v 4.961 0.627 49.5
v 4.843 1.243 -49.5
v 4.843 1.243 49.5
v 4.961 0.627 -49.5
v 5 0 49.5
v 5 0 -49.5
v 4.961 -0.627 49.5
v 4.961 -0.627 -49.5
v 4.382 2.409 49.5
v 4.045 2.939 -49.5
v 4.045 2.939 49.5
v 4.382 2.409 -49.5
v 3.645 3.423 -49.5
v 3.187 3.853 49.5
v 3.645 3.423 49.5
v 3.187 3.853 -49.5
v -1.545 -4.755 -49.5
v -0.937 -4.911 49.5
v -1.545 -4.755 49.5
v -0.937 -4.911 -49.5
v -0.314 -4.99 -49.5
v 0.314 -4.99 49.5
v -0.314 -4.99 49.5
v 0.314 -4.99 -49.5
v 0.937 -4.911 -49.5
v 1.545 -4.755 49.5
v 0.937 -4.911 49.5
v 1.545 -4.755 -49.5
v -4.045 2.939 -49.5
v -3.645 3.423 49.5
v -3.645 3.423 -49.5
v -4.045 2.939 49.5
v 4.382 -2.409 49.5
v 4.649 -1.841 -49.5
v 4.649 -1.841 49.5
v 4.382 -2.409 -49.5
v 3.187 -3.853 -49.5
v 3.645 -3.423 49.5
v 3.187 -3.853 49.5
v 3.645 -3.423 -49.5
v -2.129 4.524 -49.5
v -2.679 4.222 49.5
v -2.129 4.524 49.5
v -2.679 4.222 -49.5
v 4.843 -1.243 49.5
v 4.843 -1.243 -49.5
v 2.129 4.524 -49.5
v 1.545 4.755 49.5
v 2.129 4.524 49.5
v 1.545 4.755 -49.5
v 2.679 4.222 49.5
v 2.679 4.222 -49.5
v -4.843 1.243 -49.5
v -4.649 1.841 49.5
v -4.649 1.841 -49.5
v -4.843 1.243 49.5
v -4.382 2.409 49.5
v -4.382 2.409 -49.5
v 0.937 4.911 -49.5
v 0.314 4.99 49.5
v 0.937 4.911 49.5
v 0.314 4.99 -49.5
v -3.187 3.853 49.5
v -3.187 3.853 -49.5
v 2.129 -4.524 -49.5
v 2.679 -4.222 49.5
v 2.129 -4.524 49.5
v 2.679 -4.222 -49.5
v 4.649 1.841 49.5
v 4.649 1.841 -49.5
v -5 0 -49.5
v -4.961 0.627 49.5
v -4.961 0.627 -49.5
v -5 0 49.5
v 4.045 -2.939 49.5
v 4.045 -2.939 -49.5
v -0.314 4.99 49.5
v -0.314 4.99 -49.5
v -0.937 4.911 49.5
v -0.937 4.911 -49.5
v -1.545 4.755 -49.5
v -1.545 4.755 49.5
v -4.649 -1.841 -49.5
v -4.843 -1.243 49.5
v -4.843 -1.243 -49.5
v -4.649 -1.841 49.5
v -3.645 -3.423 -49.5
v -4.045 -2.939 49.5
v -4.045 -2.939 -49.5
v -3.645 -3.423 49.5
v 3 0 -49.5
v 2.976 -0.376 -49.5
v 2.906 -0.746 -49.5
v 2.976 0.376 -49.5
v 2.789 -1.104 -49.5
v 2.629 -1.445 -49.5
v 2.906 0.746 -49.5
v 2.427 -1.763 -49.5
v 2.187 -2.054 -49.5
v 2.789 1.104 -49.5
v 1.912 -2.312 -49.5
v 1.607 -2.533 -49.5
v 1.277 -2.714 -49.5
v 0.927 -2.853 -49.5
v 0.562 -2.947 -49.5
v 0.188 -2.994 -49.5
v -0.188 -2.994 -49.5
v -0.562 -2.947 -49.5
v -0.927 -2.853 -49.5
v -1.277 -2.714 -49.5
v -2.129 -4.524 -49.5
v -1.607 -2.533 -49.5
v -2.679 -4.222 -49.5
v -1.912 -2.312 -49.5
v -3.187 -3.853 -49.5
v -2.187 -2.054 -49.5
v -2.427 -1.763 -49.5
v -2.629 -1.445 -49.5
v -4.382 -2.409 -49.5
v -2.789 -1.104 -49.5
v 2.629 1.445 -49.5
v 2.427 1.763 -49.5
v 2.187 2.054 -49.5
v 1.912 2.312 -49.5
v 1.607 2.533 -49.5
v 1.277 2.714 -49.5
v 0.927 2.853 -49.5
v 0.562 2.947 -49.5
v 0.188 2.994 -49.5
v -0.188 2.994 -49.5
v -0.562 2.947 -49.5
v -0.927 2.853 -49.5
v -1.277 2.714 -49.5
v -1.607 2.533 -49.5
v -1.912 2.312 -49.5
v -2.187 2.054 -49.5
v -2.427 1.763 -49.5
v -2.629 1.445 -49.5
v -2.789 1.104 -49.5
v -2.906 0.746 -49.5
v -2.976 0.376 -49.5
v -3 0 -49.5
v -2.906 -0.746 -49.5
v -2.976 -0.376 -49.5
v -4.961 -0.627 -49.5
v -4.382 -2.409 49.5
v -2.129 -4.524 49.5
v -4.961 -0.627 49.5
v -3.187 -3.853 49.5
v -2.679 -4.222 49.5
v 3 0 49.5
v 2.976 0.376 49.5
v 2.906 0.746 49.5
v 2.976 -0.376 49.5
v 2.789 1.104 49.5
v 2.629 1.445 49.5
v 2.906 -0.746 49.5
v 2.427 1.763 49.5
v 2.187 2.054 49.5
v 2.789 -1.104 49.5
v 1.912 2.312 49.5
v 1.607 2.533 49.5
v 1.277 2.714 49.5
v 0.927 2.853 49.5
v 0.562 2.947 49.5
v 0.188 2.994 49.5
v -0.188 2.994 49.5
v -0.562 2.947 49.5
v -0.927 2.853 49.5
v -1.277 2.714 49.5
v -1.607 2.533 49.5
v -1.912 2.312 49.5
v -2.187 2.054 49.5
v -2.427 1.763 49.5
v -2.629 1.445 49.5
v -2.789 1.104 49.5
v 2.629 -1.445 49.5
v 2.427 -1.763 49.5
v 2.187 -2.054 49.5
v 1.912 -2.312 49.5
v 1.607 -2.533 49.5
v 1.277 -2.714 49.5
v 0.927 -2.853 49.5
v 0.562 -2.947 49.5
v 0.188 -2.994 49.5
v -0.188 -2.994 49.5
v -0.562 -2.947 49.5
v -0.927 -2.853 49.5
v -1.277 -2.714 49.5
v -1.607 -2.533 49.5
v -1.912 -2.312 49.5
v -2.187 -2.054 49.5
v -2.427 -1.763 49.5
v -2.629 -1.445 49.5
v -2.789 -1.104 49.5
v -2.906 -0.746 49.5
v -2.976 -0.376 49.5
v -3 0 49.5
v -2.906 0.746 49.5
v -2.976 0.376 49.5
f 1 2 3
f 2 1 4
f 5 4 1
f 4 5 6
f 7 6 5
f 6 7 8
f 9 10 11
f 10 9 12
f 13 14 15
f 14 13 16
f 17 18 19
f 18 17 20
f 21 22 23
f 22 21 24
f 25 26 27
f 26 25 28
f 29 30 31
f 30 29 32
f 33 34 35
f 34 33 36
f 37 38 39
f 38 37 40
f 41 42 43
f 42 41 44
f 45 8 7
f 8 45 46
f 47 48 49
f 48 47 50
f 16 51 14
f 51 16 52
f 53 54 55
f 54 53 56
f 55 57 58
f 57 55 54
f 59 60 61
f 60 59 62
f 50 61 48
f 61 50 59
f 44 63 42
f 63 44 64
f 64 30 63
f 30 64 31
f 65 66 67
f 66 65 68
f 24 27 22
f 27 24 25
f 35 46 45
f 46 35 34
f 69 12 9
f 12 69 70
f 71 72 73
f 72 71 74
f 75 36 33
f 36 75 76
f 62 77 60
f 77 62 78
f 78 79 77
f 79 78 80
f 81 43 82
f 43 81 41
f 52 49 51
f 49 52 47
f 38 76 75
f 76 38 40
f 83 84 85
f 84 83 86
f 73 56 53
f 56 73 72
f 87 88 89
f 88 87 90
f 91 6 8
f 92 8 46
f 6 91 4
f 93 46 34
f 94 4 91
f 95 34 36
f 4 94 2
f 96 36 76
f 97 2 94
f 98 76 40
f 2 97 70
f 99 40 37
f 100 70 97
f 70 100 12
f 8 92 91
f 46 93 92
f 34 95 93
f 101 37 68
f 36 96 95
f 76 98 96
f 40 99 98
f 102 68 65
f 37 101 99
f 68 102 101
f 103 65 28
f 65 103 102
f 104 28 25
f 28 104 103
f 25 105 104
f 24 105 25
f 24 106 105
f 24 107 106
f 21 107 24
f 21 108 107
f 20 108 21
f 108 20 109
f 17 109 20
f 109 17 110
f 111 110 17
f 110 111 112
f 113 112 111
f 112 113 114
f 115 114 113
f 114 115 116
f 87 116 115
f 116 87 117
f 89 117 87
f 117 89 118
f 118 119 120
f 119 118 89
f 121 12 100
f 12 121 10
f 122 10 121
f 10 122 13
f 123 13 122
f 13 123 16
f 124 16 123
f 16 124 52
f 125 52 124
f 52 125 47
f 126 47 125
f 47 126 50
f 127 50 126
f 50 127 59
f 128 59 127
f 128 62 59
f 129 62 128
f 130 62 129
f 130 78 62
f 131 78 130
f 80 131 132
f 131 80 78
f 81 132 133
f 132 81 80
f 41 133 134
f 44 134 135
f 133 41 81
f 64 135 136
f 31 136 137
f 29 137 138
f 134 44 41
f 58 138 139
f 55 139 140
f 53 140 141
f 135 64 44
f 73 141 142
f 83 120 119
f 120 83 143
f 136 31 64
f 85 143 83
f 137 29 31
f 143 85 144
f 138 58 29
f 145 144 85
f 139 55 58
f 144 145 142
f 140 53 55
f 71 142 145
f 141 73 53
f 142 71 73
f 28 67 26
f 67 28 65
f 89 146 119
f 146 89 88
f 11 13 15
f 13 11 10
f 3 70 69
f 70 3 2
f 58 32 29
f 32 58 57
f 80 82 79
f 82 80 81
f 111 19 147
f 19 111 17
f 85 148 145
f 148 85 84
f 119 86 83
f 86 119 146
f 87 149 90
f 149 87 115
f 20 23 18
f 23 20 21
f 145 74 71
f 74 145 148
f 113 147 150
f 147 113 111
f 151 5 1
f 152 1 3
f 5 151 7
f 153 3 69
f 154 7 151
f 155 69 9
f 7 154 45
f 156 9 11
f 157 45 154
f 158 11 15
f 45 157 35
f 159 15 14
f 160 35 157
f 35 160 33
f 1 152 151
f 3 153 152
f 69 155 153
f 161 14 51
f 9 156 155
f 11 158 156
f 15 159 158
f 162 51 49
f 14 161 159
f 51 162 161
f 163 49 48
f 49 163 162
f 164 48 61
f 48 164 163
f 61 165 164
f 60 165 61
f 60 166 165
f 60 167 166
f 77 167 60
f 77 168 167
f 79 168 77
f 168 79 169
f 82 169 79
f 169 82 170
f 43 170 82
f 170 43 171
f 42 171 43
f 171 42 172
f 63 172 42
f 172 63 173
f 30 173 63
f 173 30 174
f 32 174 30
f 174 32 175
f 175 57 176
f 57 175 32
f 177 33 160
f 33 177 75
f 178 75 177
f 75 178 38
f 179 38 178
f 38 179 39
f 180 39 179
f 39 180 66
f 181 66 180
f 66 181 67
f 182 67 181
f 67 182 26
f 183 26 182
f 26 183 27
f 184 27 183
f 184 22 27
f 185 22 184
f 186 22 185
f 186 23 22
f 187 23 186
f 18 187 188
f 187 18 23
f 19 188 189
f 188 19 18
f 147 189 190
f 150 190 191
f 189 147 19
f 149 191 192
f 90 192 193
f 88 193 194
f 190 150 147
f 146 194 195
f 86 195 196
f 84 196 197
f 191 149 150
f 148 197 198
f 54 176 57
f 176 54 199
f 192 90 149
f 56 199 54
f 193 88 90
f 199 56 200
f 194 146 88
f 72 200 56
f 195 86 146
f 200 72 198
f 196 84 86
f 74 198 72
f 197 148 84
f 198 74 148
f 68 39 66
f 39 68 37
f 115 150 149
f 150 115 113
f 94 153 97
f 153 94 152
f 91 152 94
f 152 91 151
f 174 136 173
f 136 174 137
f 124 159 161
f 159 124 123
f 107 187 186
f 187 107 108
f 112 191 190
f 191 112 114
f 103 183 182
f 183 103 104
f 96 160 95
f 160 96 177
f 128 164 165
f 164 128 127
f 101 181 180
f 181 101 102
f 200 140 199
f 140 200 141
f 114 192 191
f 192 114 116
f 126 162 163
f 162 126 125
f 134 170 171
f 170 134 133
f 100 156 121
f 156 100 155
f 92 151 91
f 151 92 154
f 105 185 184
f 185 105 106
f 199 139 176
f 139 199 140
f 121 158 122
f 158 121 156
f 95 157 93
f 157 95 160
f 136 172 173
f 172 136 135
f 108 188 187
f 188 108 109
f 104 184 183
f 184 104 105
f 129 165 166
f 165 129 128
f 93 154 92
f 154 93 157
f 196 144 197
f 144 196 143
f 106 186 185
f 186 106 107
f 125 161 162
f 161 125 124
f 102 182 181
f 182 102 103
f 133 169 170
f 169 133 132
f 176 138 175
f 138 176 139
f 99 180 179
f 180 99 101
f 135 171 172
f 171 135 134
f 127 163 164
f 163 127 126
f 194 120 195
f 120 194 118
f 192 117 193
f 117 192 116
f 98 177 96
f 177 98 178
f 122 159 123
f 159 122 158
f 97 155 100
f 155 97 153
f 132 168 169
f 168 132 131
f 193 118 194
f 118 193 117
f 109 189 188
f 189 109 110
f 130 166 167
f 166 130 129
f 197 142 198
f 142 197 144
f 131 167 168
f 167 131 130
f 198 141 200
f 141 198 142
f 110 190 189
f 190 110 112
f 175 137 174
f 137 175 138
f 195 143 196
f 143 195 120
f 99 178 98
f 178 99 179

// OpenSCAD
$fn = 50;


difference() {
	union() {
		translate(v = [0, 0, -49.5000000000]) {
			cylinder(h = 99, r = 5.0000000000);
		}
	}
	union() {
		translate(v = [0, 0, -100.0000000000]) {
			cylinder(h = 200, r = 3.0000000000);
		}
	}
}
